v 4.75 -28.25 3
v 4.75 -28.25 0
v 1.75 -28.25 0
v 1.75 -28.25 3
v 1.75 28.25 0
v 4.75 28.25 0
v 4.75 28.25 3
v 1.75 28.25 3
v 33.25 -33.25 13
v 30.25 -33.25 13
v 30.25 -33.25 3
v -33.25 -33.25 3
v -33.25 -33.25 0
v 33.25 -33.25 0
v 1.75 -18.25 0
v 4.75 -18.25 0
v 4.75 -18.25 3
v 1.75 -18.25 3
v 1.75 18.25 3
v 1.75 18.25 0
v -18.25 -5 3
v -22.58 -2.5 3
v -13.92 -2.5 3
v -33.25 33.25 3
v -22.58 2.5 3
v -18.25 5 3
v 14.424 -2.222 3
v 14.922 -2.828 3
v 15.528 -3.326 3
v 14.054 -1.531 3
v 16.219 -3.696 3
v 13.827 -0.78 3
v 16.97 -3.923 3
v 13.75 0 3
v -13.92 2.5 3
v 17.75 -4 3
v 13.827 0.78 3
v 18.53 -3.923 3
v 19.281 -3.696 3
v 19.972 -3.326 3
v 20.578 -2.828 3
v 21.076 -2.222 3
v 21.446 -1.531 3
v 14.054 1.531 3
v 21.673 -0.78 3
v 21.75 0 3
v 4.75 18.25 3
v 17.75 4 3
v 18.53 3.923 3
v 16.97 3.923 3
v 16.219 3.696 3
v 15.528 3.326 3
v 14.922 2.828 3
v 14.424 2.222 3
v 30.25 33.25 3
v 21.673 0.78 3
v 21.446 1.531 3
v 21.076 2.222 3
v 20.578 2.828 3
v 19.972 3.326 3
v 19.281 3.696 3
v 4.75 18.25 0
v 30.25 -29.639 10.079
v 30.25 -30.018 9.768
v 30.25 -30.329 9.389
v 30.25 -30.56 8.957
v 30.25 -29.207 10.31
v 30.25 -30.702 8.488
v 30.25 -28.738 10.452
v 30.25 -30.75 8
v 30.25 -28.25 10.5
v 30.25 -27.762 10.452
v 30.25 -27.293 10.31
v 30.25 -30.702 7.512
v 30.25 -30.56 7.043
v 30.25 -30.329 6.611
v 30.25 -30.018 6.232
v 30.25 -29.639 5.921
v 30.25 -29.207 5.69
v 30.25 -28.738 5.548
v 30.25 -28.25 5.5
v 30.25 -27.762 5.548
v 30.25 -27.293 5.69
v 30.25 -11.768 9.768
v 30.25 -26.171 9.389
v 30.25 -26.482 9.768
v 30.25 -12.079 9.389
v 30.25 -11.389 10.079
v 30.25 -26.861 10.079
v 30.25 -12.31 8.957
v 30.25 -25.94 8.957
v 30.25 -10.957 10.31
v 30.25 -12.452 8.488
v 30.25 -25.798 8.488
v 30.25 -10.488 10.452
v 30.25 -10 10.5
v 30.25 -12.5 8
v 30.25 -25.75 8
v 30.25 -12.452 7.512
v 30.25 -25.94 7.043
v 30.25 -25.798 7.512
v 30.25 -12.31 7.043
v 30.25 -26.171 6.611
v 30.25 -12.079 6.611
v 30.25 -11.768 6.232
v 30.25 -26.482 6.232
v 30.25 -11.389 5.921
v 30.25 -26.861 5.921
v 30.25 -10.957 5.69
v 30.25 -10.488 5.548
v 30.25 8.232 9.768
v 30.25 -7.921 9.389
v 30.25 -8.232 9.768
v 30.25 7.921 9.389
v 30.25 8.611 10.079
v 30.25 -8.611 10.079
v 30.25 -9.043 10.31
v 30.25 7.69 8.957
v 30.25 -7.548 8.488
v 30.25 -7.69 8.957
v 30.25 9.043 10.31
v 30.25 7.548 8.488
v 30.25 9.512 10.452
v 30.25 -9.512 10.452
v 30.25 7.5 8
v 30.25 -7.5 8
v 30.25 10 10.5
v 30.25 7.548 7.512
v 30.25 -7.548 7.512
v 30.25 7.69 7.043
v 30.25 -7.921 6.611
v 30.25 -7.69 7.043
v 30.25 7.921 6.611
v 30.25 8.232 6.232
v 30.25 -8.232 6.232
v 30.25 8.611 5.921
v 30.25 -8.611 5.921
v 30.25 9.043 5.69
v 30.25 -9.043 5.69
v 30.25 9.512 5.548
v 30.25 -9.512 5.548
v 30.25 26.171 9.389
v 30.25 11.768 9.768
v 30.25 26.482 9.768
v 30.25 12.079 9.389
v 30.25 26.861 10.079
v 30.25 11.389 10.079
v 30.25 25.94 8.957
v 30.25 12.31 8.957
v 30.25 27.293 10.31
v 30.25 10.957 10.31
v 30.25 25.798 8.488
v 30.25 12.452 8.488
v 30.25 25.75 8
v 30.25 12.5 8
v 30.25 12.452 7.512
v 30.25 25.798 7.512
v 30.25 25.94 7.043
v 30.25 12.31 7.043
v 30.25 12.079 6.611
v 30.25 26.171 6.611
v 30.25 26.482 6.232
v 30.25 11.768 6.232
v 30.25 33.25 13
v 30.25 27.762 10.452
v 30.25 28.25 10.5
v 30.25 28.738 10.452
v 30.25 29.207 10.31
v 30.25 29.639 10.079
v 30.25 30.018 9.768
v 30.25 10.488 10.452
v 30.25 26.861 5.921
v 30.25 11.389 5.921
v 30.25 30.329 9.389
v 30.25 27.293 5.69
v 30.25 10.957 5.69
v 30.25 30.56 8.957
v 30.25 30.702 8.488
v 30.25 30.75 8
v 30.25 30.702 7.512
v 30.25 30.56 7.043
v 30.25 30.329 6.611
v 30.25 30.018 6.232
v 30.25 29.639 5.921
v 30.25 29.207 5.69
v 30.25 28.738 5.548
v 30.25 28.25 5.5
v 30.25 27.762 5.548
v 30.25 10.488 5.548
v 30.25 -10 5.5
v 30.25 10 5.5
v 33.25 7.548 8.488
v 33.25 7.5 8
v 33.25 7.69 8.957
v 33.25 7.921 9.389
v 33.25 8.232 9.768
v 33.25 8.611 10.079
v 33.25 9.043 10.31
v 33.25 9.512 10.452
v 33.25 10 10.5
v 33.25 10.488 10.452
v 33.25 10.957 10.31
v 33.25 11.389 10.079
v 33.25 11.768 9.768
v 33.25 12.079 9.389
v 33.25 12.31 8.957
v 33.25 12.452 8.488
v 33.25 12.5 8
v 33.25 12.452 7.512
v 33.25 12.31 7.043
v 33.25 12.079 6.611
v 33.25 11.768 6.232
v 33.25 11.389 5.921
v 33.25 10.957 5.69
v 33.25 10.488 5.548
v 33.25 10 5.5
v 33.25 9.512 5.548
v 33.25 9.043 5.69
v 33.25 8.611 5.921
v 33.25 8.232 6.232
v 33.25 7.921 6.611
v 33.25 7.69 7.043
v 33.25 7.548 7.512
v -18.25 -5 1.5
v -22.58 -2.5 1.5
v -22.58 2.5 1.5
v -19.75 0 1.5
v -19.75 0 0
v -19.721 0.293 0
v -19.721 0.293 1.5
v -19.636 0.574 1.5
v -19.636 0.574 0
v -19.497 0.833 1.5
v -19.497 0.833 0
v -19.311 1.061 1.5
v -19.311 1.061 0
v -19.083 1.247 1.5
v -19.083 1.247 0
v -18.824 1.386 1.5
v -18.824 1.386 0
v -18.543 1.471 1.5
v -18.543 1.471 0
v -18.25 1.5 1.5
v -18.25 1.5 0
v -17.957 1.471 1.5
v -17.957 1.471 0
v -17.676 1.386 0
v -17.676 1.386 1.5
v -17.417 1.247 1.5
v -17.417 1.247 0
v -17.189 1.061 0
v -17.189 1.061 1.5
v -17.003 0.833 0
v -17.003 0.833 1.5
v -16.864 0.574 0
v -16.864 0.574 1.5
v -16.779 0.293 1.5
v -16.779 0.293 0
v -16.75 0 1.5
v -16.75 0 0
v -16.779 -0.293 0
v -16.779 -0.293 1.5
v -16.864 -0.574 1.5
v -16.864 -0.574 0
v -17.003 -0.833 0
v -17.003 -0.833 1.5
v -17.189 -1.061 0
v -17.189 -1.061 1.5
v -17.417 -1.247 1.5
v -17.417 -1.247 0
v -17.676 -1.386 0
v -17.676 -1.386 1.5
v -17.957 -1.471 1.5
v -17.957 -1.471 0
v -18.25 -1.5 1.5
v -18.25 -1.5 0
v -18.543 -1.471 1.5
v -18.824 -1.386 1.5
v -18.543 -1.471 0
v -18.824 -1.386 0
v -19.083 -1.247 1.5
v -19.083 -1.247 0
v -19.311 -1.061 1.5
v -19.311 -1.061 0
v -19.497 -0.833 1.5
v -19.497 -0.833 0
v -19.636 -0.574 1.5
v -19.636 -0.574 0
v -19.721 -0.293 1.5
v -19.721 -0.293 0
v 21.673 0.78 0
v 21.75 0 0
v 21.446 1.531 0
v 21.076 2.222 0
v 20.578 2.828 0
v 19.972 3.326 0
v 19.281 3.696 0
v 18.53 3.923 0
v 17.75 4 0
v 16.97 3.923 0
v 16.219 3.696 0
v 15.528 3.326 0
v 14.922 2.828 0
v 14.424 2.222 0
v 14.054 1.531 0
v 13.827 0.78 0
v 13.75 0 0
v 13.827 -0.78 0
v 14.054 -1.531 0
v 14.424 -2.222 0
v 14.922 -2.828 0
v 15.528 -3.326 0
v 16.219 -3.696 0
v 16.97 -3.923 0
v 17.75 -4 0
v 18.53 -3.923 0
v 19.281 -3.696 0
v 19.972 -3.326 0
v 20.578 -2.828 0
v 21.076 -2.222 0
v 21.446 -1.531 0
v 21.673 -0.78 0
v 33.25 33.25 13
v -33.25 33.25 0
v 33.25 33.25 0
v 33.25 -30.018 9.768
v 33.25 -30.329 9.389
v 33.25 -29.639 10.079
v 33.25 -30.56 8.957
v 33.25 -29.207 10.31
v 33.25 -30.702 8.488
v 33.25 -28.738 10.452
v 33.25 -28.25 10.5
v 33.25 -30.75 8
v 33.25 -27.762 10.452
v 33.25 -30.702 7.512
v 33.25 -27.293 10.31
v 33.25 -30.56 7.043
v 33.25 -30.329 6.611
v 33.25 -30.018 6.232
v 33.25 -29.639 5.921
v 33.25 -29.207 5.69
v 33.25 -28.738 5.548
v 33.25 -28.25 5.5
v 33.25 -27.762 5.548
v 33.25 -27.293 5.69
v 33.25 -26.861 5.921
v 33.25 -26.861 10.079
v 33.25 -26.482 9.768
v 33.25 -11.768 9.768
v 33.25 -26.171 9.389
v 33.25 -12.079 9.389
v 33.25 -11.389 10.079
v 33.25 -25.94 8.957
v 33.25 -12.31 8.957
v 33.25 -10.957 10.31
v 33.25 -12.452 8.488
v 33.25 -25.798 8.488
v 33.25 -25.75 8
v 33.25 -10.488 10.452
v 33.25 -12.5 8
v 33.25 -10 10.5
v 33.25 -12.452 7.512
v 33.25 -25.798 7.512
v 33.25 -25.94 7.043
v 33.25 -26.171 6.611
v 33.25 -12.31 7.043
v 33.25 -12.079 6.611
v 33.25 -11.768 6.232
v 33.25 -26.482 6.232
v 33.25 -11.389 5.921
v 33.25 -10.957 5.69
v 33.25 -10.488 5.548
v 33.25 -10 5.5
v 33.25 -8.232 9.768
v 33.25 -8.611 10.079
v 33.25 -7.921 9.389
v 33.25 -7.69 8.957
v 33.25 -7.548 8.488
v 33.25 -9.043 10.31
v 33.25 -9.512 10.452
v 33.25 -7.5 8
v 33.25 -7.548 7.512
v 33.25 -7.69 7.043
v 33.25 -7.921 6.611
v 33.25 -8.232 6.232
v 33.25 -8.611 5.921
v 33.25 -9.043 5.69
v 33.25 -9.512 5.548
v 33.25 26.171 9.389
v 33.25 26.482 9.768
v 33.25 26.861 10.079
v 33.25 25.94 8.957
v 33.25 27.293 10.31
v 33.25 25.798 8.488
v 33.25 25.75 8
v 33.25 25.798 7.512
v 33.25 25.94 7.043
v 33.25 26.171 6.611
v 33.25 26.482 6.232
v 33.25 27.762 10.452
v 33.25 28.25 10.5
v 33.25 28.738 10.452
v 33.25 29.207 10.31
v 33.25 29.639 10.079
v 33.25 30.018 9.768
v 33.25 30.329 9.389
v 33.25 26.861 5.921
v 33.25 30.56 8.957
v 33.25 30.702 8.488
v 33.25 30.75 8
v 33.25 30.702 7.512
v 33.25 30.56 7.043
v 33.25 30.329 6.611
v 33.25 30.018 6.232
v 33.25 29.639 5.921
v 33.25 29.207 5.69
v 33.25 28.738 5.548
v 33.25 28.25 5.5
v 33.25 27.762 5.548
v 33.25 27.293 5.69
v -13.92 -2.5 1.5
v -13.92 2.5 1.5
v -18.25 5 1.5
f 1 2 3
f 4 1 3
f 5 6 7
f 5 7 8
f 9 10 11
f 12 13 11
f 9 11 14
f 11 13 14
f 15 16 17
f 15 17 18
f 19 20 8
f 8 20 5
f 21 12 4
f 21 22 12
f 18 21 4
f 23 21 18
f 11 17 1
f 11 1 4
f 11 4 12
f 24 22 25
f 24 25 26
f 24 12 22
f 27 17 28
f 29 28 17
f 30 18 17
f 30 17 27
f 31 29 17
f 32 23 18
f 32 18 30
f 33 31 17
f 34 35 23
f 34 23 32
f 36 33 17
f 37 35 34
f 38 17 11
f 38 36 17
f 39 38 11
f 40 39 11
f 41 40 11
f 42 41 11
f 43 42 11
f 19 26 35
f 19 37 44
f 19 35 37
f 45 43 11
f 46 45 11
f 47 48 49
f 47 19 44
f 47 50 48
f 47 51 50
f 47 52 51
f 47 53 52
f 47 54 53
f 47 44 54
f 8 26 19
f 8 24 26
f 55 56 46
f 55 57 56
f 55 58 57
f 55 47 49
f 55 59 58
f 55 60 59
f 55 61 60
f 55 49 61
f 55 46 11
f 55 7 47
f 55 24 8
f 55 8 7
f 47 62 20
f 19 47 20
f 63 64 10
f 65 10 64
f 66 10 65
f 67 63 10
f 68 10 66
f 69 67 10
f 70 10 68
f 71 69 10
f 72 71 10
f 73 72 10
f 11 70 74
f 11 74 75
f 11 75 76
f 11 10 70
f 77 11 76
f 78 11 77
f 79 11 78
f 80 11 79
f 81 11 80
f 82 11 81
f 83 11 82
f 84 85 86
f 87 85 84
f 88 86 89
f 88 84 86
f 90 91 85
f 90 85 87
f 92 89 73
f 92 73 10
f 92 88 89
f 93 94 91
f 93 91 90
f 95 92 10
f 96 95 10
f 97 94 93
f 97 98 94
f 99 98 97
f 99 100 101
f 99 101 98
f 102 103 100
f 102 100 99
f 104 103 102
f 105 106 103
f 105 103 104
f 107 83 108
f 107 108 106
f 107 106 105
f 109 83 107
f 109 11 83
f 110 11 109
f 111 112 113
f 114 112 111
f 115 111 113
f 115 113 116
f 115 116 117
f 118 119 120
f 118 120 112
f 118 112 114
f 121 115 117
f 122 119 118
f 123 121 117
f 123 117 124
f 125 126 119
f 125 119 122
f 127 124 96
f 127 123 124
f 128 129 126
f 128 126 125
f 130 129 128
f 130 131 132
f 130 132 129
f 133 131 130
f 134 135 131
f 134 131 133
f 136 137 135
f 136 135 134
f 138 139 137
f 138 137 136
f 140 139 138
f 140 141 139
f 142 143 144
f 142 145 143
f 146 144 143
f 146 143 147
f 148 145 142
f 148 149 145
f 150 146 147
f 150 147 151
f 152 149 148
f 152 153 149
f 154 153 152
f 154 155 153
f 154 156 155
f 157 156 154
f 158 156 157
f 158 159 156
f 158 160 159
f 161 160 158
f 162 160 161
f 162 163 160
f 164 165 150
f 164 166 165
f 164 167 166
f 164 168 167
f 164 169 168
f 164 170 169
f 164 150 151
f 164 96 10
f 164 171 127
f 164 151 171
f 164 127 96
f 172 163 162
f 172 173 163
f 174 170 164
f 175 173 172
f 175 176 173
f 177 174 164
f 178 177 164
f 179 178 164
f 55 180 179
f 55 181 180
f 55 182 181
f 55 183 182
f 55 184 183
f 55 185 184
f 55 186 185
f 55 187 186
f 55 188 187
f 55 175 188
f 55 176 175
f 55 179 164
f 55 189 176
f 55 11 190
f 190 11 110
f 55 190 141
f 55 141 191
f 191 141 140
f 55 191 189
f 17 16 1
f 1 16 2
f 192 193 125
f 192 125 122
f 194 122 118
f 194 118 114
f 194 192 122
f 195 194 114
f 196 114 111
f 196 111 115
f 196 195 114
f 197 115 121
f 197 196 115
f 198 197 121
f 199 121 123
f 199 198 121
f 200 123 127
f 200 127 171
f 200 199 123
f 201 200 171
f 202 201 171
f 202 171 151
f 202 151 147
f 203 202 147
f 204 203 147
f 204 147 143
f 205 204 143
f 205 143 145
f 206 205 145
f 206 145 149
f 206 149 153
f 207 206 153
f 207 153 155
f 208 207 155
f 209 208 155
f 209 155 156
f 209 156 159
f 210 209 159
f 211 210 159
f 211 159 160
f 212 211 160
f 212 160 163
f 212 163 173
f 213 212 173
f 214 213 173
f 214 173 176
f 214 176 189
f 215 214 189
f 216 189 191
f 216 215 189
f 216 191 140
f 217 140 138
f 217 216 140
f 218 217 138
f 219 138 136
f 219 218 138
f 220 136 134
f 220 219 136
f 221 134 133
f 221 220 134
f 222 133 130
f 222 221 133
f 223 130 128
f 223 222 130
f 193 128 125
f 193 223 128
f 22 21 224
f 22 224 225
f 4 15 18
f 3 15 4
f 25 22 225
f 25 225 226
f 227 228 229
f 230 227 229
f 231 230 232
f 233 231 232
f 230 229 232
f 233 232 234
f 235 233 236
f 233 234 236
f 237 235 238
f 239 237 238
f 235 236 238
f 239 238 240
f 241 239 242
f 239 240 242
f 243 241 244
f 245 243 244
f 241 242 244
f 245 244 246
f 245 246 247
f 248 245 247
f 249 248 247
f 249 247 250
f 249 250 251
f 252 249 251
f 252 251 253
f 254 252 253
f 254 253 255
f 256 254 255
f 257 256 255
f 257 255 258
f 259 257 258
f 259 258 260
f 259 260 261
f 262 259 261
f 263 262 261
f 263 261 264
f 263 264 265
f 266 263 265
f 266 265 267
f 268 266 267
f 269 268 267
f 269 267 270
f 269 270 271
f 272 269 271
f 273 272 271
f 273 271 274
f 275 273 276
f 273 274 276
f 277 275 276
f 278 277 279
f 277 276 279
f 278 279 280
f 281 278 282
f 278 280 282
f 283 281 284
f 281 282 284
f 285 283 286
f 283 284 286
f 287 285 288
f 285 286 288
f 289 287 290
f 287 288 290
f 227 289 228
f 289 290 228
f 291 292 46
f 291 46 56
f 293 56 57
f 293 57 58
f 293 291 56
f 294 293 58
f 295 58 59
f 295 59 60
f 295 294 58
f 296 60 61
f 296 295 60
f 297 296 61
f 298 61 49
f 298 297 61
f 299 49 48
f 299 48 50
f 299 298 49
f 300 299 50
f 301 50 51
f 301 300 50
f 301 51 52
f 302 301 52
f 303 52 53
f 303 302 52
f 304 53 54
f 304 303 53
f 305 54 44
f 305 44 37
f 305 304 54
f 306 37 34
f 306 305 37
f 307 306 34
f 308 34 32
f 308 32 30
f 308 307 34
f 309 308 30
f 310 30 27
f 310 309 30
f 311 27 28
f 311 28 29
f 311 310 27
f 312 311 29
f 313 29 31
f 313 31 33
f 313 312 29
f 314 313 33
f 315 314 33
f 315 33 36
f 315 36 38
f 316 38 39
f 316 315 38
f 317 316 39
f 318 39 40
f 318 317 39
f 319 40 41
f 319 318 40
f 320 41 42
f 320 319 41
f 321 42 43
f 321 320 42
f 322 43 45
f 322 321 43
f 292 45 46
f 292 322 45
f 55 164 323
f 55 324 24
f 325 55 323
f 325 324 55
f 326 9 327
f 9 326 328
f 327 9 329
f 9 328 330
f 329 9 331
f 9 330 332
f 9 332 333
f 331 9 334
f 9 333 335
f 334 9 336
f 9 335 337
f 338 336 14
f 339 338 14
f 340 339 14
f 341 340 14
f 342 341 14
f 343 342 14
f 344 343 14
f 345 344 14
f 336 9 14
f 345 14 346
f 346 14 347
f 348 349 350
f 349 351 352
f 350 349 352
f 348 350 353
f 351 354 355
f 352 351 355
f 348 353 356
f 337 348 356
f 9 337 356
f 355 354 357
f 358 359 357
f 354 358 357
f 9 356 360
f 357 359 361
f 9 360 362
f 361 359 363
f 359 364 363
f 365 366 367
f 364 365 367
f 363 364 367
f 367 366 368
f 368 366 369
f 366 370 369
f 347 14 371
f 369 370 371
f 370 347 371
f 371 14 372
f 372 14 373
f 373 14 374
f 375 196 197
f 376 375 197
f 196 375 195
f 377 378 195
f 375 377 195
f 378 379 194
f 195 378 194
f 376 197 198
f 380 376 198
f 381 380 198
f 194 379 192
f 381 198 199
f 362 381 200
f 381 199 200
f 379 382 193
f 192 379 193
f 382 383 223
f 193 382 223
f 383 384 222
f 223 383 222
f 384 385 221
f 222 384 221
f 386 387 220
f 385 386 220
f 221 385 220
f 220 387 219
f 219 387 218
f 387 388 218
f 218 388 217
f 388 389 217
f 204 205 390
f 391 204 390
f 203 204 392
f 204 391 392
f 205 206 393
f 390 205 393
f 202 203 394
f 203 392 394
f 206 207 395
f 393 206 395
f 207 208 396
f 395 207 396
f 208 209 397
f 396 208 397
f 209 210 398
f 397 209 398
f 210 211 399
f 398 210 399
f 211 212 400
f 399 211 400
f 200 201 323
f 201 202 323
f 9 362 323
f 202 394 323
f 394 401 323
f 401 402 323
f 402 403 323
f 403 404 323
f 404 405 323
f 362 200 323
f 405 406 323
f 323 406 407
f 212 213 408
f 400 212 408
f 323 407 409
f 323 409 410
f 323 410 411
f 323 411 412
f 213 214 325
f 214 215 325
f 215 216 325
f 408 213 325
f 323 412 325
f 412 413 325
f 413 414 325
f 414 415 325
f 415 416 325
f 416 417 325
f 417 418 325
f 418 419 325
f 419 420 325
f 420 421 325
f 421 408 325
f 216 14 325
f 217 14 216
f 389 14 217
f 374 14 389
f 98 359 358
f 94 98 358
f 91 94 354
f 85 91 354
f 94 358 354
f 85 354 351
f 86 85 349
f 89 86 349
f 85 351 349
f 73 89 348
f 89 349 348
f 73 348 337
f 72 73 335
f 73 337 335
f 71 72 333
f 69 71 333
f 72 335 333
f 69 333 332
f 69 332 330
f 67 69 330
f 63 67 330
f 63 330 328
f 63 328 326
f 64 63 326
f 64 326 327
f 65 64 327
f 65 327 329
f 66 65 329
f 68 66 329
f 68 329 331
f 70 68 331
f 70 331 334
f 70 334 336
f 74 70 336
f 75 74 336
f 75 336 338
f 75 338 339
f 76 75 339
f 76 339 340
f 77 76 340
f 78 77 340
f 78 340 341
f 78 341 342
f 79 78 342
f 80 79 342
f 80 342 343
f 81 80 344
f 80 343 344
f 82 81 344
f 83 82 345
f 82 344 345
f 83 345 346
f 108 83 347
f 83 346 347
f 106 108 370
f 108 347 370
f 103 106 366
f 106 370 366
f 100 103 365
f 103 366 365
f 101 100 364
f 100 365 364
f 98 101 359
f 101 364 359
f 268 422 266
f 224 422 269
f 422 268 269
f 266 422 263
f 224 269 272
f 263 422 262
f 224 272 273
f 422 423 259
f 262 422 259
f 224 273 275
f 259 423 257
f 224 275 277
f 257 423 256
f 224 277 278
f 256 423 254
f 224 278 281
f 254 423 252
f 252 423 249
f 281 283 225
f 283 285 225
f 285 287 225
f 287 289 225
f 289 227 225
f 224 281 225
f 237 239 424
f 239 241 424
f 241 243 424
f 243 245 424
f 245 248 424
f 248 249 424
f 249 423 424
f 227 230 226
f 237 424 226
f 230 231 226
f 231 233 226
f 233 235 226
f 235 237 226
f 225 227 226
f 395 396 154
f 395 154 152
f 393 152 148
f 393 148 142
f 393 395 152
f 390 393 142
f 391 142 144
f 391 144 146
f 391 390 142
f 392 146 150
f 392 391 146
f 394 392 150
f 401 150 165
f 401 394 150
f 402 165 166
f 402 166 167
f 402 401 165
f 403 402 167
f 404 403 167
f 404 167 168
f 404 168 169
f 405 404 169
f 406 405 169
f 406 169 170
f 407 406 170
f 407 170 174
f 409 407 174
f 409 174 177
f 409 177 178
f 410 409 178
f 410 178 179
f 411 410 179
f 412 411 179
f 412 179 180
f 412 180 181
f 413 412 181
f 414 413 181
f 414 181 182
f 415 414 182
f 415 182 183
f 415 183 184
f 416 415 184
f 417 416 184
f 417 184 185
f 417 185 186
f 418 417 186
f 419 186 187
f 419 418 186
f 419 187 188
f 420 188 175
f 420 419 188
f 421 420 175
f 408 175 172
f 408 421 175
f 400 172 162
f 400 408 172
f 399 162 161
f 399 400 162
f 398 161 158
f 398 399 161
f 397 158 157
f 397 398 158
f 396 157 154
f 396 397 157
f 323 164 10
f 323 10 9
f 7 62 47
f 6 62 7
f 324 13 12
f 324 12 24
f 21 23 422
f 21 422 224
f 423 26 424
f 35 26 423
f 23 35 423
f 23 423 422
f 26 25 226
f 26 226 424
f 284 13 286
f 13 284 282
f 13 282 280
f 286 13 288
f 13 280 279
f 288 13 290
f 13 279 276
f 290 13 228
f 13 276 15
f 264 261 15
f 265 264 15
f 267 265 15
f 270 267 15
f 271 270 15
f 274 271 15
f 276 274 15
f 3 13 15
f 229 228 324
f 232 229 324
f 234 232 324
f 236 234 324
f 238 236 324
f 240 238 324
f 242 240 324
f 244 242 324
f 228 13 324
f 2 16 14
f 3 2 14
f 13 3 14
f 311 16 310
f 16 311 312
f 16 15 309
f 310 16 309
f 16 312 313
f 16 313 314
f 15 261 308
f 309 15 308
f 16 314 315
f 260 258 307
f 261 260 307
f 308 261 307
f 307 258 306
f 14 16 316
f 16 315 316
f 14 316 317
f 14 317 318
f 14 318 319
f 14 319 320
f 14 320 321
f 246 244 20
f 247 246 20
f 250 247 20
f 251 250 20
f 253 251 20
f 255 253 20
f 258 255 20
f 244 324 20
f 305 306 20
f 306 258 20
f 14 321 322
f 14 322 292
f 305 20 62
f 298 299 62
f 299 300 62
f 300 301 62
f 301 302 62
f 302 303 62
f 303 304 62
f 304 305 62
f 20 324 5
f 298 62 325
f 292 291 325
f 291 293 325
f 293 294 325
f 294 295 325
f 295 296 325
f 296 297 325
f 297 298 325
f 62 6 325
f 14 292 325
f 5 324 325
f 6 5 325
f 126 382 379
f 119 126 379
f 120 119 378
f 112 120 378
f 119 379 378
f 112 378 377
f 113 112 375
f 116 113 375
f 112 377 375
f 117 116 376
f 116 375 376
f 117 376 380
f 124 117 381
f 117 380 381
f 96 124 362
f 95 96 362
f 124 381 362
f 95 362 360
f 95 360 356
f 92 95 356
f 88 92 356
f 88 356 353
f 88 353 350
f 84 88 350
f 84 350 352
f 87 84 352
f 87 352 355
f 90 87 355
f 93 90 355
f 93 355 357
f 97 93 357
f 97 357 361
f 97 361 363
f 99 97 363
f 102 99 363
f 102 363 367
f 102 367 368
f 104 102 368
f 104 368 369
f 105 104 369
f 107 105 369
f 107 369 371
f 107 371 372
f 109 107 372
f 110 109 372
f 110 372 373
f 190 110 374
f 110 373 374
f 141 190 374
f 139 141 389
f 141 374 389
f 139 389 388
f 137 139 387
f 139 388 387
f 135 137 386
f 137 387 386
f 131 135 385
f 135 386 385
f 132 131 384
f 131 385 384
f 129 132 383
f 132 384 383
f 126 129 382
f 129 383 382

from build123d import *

# Parameters (mm, degrees)
SKETCH1_W           = 66.5
SKETCH1_H           = 66.5
SKETCH1_R           = 4
BOSS_EXTRUDE1_DEPTH = 3
SKETCH3_W           = 3
SKETCH3_H           = 66.5
BOSS_EXTRUDE2_DEPTH = 10
CUT_EXTRUDE1_REACH  = 77.477
SKETCH5_R           = 2.5
CUT_EXTRUDE2_REACH  = 50.787
SKETCH6_W           = 3
SKETCH6_H           = 10
CUT_EXTRUDE5_DEPTH  = 1.5
CUT_EXTRUDE6_REACH  = 50.787
SKETCH9_R           = 1.5


with BuildPart() as part:
    # Sketch1 → Boss-Extrude1 (new body)
    with BuildSketch(Plane.XY):
        Rectangle(SKETCH1_W, SKETCH1_H)
        with Locations((17.75, 0)):
            Circle(SKETCH1_R, mode=Mode.SUBTRACT)
    extrude(amount=BOSS_EXTRUDE1_DEPTH)

    # Sketch3 → Boss-Extrude2 (add)
    with BuildSketch(Plane.XY.offset(3)):
        with Locations((31.75, 0)):
            Rectangle(SKETCH3_W, SKETCH3_H)
    extrude(amount=BOSS_EXTRUDE2_DEPTH)

    # Sketch5 → Cut-Extrude1 (cut, up to next)
    with BuildSketch(Plane(origin=(33.25, 0, 0), x_dir=(0, 0, -1), z_dir=(1, 0, 0)), mode=Mode.PRIVATE) as cut_extrude1_sk1:
        with Locations(Location((-8, -28.25, 0), (0, 0, 90))):
            Circle(SKETCH5_R)
    cut_extrude1_tool1 = extrude(cut_extrude1_sk1.sketch, amount=-CUT_EXTRUDE1_REACH, mode=Mode.PRIVATE) & part.part
    # Sketch5 → Cut-Extrude1 (cut, up to next)
    with BuildSketch(Plane(origin=(33.25, 0, 0), x_dir=(0, 0, -1), z_dir=(1, 0, 0)), mode=Mode.PRIVATE) as cut_extrude1_sk2:
        with Locations(Location((-8, -10, 0), (0, 0, 90))):
            Circle(SKETCH5_R)
    cut_extrude1_tool2 = extrude(cut_extrude1_sk2.sketch, amount=-CUT_EXTRUDE1_REACH, mode=Mode.PRIVATE) & part.part
    cut_extrude1_1 = cut_extrude1_tool1.solids().sort_by_distance((33.25, -28.25, 8))[0]
    add(cut_extrude1_1, mode=Mode.SUBTRACT)
    cut_extrude1_2 = cut_extrude1_tool2.solids().sort_by_distance((33.25, -10, 8))[0]
    add(cut_extrude1_2, mode=Mode.SUBTRACT)
    cut_extrude1 = cut_extrude1_1 + cut_extrude1_2  # Cut-Extrude1 as one shape, for the pattern or mirror that repeats it

    # Mirror2: Cut-Extrude1 across plane
    add(cut_extrude1.mirror(Plane.ZX), mode=Mode.SUBTRACT)

    # Sketch6 → Cut-Extrude2 (cut, up to next)
    with BuildSketch(Plane(origin=(0, 0, 0), x_dir=(-1, 0, 0), z_dir=(0, 0, -1)), mode=Mode.PRIVATE) as cut_extrude2_sk1:
        with Locations((-3.25, 23.25)):
            Rectangle(SKETCH6_W, SKETCH6_H)
    cut_extrude2_tool1 = extrude(cut_extrude2_sk1.sketch, amount=-CUT_EXTRUDE2_REACH, mode=Mode.PRIVATE) & part.part
    cut_extrude2 = cut_extrude2_tool1.solids().sort_by_distance((3.25, 23.25, 0))[0]
    add(cut_extrude2, mode=Mode.SUBTRACT)

    # Mirror3: Cut-Extrude2 across plane
    add(cut_extrude2.mirror(Plane.ZX), mode=Mode.SUBTRACT)

    # Sketch7 → Cut-Extrude5 (cut)
    with BuildSketch(Plane(origin=(0, 0, 3), x_dir=(-1, 0, 0), z_dir=(0, 0, -1))):
        Polygon((18.25, -5), (22.580127019, -2.5), (22.580127019, 2.5), (18.25, 5), (13.919872981, 2.5), (13.919872981, -2.5), align=None)
    extrude(amount=CUT_EXTRUDE5_DEPTH, mode=Mode.SUBTRACT)

    # Sketch9 → Cut-Extrude6 (cut, up to next)
    with BuildSketch(Plane(origin=(0, 0, 0), x_dir=(-1, 0, 0), z_dir=(0, 0, -1)), mode=Mode.PRIVATE) as cut_extrude6_sk1:
        with Locations((18.25, 0)):
            Circle(SKETCH9_R)
    cut_extrude6_tool1 = extrude(cut_extrude6_sk1.sketch, amount=-CUT_EXTRUDE6_REACH, mode=Mode.PRIVATE) & part.part
    add(cut_extrude6_tool1.solids().sort_by_distance((-18.25, 0, 0))[0], mode=Mode.SUBTRACT)


solid = part.part
